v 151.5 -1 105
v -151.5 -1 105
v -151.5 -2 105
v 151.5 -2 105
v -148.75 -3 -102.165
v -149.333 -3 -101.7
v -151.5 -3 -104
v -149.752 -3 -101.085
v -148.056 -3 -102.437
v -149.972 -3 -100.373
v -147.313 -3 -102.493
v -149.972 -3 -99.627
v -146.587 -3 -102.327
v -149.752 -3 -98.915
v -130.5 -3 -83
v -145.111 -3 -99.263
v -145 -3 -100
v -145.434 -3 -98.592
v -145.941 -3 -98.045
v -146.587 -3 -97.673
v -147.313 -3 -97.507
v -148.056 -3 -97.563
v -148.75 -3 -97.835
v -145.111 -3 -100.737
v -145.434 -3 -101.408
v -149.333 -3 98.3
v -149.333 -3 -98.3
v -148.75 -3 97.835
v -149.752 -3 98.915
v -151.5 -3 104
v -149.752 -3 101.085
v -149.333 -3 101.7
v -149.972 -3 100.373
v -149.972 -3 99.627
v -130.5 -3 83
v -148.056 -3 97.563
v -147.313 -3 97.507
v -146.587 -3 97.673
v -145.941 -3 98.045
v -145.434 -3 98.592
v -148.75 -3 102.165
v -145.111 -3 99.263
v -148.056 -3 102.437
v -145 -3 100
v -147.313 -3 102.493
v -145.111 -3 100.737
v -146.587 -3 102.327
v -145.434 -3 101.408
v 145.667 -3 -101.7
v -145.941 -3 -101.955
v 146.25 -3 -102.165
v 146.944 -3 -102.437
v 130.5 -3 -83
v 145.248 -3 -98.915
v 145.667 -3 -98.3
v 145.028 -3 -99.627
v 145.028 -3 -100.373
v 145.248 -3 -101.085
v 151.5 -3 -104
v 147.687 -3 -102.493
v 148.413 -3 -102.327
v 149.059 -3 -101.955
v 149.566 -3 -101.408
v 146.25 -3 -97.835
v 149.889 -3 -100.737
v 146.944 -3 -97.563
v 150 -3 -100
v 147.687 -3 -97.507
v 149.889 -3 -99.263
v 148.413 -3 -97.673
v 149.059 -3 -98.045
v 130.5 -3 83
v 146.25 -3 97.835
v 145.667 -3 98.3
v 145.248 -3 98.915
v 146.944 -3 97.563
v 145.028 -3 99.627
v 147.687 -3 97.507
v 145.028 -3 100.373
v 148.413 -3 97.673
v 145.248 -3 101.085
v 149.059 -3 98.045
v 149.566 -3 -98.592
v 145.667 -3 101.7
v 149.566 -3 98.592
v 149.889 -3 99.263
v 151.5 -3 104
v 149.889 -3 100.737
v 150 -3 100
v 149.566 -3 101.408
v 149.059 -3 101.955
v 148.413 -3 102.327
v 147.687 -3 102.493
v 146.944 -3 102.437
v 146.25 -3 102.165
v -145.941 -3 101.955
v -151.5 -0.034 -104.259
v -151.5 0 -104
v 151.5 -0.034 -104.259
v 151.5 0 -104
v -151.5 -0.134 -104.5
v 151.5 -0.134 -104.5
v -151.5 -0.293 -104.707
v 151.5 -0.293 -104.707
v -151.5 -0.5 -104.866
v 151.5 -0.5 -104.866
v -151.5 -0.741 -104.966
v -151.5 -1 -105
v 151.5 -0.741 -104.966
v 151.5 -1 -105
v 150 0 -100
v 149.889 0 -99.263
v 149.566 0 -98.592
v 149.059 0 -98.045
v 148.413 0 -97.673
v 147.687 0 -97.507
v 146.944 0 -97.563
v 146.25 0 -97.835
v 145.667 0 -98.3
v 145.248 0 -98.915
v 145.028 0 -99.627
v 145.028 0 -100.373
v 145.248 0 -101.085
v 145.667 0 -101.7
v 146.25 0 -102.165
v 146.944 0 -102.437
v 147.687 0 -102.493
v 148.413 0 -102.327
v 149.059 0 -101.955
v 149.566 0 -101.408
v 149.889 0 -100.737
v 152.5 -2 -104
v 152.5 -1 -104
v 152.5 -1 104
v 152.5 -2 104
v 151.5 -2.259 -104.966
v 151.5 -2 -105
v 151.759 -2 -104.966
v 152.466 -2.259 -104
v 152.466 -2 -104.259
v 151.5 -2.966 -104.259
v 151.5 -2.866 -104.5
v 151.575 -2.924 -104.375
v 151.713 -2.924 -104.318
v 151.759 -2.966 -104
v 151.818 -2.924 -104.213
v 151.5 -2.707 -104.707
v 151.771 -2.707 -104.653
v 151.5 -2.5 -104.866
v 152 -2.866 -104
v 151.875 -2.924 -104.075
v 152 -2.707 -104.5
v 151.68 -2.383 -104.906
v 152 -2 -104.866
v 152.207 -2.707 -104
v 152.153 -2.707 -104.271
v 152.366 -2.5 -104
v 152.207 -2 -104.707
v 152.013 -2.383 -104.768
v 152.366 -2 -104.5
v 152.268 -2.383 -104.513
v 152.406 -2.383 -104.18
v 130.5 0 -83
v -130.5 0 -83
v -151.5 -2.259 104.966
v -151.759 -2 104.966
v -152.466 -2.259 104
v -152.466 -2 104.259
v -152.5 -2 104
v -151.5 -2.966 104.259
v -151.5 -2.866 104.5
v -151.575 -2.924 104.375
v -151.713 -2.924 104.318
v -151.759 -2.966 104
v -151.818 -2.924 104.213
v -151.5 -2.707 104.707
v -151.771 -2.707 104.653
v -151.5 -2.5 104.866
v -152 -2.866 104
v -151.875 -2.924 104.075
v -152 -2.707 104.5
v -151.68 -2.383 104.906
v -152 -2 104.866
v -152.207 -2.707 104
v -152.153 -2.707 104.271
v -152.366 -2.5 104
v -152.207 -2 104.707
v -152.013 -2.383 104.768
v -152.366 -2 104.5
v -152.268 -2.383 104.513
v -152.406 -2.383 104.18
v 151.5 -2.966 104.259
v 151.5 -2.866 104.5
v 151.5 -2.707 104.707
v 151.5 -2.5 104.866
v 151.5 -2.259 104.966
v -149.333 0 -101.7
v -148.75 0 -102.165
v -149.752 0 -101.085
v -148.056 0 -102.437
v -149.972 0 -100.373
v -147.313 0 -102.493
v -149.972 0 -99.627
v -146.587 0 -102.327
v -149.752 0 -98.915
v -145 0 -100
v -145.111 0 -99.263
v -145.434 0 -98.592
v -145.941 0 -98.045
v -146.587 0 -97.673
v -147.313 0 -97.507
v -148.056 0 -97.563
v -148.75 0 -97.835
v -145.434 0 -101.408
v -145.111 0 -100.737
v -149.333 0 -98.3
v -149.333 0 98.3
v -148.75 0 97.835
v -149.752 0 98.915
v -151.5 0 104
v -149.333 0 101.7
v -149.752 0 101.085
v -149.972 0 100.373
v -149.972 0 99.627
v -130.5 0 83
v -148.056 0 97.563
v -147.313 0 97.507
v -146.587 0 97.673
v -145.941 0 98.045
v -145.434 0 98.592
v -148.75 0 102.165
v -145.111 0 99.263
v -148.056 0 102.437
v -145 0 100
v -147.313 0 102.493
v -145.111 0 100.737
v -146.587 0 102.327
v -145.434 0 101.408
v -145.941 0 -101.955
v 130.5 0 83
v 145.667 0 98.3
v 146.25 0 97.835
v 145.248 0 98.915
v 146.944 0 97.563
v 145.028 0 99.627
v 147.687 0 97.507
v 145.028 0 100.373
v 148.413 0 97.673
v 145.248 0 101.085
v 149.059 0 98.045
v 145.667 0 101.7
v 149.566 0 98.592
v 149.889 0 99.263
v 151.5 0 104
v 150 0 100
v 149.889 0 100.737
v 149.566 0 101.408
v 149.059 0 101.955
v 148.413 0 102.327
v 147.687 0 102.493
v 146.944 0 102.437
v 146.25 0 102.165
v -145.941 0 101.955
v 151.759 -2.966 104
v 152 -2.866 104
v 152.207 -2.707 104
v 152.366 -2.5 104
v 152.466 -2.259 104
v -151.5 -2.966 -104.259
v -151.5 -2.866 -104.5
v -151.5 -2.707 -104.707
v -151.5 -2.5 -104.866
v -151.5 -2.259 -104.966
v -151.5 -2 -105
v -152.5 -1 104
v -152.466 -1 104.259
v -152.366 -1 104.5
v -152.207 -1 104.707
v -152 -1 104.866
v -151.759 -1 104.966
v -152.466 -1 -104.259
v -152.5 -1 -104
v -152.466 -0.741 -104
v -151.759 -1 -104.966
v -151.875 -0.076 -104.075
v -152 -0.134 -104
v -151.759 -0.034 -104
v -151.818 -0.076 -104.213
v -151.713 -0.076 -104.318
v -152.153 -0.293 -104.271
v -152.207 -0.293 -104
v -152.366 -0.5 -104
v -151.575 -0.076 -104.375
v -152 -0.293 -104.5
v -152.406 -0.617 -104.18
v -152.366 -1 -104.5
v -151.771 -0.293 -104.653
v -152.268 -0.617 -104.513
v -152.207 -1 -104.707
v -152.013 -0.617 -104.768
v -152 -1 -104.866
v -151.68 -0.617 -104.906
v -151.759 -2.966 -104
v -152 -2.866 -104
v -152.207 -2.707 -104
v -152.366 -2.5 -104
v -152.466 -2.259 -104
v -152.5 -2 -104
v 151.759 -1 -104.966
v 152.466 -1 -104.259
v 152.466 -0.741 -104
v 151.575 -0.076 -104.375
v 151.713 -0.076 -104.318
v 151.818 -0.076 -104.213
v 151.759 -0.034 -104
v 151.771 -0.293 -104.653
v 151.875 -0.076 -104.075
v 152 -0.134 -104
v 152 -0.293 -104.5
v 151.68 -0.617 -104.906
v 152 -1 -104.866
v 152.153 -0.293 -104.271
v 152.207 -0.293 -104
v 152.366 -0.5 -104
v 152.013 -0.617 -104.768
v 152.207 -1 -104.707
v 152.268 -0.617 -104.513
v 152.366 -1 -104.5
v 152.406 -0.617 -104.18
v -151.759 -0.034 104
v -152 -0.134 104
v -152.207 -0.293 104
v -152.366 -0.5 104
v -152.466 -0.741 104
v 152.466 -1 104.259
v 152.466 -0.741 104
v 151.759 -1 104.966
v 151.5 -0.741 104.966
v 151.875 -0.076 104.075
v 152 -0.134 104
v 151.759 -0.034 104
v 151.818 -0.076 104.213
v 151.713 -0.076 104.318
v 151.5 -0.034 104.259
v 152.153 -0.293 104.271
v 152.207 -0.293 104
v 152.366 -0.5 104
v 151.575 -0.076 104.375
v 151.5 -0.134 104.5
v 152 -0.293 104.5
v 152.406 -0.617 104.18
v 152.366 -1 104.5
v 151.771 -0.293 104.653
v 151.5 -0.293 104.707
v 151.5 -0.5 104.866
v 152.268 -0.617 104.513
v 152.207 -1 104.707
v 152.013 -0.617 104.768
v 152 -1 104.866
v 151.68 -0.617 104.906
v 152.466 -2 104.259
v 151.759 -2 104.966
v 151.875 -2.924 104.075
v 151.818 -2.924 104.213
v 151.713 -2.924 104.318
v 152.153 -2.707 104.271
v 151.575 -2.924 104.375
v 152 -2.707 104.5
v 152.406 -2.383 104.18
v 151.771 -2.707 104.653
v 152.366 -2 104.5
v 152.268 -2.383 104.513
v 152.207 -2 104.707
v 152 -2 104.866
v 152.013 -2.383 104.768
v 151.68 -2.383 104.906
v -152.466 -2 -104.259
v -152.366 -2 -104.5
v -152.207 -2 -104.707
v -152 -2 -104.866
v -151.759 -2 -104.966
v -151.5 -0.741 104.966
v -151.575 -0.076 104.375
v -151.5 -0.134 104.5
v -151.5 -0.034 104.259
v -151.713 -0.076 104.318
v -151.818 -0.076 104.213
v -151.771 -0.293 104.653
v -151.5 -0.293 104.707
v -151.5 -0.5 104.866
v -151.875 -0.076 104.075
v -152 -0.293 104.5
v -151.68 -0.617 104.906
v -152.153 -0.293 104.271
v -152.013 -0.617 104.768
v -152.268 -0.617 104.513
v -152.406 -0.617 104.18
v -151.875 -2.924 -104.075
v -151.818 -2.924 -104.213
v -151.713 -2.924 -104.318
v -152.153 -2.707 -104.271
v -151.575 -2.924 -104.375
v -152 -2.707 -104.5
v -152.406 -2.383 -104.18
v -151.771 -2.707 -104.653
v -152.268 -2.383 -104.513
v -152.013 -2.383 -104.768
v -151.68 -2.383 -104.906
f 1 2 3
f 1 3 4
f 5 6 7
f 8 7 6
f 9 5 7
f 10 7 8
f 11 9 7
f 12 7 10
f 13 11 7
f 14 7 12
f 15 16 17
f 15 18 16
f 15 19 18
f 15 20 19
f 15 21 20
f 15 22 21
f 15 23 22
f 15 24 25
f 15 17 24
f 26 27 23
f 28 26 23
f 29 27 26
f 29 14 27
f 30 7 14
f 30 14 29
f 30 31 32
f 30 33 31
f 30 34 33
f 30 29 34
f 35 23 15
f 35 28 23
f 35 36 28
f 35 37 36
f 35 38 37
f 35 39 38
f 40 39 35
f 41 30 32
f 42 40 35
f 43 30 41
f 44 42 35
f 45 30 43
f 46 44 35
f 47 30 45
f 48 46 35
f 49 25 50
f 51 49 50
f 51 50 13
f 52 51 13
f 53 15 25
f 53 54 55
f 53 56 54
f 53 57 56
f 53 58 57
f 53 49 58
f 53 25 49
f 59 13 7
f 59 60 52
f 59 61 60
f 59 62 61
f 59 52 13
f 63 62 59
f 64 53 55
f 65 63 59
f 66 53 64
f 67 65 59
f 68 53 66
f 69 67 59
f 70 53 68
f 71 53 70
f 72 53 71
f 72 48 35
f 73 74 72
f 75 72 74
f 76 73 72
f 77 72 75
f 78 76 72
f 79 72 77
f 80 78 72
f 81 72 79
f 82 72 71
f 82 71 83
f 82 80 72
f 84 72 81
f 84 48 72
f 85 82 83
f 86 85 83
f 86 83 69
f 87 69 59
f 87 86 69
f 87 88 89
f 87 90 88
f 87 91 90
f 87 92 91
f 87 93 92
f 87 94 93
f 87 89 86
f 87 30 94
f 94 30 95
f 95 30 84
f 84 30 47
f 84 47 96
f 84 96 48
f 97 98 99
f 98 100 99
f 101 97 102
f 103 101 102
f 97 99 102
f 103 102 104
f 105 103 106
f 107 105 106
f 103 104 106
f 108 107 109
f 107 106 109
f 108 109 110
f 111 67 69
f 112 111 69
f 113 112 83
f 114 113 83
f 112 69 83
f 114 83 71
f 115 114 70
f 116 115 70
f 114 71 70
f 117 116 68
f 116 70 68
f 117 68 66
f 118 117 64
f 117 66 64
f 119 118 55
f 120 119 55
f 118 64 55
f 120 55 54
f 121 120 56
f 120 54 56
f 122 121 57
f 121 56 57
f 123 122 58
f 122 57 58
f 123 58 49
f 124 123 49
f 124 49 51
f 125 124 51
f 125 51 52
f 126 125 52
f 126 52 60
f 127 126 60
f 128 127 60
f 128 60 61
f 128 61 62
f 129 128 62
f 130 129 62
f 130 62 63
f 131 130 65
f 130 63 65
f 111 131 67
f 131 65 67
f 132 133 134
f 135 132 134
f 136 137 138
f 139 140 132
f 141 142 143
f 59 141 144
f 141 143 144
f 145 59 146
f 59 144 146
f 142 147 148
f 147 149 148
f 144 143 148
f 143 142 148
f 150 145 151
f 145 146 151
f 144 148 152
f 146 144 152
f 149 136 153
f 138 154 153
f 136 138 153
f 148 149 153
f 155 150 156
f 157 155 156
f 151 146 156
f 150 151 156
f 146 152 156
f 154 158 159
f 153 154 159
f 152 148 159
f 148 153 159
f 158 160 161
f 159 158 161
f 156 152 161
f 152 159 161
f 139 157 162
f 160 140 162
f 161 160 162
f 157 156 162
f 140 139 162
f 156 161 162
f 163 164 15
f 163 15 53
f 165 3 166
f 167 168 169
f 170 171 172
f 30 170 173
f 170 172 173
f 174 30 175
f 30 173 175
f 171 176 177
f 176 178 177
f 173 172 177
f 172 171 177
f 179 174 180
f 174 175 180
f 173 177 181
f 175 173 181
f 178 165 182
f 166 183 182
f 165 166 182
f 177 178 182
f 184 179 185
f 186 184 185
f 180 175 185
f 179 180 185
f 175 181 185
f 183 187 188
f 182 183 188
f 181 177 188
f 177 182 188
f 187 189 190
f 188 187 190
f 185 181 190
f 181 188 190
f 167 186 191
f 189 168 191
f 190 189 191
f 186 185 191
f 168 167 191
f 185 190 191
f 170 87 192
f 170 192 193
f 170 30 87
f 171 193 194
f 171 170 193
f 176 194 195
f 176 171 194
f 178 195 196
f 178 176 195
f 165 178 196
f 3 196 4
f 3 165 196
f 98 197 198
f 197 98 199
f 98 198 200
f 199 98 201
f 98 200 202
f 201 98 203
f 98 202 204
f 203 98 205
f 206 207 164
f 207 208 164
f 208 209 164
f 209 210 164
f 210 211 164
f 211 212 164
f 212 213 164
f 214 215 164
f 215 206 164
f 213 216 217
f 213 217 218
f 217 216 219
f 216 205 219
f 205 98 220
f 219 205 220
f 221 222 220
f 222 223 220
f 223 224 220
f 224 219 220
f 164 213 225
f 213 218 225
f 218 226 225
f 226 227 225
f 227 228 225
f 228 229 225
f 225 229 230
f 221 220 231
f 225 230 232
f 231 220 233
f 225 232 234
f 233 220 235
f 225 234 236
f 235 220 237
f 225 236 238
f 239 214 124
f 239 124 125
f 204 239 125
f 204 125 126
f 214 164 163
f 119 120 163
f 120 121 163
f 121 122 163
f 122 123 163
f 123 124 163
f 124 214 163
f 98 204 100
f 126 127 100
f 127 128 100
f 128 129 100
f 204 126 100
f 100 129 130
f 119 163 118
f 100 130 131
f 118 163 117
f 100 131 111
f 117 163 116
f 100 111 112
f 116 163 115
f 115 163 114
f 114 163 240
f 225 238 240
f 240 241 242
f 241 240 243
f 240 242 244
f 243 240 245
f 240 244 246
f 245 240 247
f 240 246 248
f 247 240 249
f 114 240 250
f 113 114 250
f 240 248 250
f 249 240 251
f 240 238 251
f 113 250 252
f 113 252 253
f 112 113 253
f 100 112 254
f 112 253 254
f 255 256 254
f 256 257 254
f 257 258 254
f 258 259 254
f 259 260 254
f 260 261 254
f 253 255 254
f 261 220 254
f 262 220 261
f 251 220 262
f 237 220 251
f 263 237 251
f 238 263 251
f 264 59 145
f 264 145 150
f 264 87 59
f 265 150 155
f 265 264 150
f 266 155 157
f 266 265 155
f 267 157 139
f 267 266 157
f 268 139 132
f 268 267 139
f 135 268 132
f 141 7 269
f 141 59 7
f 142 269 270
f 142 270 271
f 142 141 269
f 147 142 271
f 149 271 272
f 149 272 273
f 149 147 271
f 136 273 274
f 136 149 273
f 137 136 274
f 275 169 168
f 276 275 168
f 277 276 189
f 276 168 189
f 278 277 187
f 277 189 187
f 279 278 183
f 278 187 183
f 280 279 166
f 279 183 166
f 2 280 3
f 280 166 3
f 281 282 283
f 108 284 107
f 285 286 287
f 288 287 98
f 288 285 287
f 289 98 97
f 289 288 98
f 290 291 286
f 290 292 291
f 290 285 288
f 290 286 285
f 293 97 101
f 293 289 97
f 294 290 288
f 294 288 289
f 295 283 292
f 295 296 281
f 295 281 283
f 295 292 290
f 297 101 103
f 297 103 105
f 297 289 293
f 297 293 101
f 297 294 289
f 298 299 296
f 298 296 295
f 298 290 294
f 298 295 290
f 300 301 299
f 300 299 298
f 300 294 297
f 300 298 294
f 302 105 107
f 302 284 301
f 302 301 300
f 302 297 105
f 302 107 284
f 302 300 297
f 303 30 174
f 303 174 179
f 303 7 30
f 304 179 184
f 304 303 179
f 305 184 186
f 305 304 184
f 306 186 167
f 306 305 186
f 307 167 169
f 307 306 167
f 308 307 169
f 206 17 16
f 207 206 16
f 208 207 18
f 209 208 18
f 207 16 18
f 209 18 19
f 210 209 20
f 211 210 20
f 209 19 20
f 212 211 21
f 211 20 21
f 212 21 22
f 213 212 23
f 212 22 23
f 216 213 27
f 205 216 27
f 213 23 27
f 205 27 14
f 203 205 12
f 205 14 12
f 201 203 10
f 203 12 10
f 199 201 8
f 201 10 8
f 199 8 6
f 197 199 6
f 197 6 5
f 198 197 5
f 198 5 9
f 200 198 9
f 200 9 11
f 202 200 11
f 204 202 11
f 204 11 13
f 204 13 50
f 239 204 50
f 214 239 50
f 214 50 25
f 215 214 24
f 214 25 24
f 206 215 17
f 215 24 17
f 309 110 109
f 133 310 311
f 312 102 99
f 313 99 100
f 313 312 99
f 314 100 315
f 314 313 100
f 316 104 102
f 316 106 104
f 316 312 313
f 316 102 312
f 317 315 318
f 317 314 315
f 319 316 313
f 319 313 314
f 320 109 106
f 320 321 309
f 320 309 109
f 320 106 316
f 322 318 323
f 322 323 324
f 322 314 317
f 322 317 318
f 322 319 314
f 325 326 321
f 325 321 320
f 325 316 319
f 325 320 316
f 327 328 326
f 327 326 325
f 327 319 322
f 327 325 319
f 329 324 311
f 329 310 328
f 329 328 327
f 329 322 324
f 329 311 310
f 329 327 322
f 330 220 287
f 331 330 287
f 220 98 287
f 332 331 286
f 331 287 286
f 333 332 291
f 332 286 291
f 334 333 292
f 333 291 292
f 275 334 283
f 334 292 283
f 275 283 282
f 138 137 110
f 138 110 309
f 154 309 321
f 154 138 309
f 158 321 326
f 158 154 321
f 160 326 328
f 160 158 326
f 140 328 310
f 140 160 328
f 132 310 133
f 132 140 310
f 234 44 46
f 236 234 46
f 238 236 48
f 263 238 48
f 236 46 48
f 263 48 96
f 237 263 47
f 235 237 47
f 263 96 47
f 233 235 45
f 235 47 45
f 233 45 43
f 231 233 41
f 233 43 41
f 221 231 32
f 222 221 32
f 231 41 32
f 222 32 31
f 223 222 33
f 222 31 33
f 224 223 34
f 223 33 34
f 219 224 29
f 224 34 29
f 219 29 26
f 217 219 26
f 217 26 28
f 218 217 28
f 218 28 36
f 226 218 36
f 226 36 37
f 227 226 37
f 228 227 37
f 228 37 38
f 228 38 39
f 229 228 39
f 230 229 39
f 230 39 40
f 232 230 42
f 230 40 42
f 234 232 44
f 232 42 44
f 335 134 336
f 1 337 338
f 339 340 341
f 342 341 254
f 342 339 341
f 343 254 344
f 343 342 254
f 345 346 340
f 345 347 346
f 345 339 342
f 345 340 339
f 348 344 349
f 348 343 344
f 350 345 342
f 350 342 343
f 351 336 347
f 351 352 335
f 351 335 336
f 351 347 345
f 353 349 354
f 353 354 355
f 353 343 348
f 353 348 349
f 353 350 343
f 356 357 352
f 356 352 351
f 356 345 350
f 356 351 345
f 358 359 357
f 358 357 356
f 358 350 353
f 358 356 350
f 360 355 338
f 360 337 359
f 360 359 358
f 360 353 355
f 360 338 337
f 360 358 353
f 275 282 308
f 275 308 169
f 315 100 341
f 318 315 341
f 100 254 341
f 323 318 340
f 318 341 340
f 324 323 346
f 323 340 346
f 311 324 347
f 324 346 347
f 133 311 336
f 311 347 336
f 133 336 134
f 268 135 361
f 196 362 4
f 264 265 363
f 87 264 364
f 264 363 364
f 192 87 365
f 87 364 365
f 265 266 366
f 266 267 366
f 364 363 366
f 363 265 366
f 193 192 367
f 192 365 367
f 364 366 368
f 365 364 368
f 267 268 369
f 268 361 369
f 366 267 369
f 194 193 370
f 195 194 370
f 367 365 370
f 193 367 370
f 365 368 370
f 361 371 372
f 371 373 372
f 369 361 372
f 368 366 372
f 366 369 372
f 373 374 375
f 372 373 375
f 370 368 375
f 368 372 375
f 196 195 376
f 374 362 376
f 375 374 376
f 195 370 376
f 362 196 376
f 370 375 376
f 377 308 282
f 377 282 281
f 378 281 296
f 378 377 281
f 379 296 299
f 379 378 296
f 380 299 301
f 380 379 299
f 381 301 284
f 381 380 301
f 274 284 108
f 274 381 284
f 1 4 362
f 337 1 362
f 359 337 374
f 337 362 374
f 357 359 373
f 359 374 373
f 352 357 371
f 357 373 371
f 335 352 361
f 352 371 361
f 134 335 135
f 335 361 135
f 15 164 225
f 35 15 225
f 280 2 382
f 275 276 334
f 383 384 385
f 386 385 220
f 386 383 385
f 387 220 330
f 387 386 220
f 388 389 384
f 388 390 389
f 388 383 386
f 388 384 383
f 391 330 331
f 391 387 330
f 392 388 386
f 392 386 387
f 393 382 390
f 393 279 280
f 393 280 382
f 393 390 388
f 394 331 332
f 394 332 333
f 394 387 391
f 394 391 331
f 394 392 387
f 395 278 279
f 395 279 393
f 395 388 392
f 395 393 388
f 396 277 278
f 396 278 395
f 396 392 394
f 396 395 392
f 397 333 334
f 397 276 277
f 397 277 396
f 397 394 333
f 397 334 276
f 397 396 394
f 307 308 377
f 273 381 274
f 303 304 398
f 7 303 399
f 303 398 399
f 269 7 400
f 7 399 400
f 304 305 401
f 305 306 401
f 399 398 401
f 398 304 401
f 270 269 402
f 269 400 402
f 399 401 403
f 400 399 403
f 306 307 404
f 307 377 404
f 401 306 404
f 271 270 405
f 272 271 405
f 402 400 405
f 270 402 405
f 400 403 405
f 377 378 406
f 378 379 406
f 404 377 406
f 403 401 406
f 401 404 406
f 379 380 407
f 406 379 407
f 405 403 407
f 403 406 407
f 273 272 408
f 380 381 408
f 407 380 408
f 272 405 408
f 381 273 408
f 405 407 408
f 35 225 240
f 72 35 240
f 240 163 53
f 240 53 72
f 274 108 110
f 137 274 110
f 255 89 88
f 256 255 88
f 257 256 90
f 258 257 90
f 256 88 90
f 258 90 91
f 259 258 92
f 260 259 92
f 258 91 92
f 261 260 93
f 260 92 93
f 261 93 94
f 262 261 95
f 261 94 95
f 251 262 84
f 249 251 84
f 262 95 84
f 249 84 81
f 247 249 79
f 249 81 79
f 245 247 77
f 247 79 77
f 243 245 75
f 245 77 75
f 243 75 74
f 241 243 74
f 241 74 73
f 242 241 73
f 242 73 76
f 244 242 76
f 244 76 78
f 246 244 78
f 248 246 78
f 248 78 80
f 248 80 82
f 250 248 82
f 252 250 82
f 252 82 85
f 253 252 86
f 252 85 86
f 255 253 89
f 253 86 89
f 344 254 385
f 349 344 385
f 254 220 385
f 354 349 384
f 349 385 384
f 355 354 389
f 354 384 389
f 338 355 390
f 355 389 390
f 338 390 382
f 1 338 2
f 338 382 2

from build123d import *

# Parameters (mm, degrees)
F0_W     = 305
F0_H     = 210
F0_W_2   = 261
F0_H_2   = 166
F1_DEPTH = 3
F2_R     = 1
F3_R     = 1
F4_R     = 2.5
F5_DEPTH = 3


with BuildPart() as f1:
    # F0 (on Front) → F1 (new body)
    with BuildSketch(Plane.XZ):
        Rectangle(F0_W, F0_H)
        Rectangle(F0_W_2, F0_H_2, mode=Mode.SUBTRACT)
    extrude(amount=F1_DEPTH)

    # F2
    f2_edges = [f1.edges().sort_by_distance(p)[0] for p in [
        (-152.5, -1.5, 105),
        (-152.5, -1.5, -105),
        (152.5, -1.5, -105),
        (152.5, -1.5, 105),
    ]]
    fillet(f2_edges, radius=F2_R)

    # F3
    f3_edges = [f1.edges().sort_by_distance(p)[0] for p in [
        (0, -3, -105),
        (0, 0, -105),
    ]]
    fillet(f3_edges, radius=F3_R)

    # F4 (on face) → F5 (cut, through all)
    with BuildSketch(Plane.XZ.offset(3)):
        with Locations((-147.5, 100)):
            Circle(F4_R)
        with Locations((147.5, 100)):
            Circle(F4_R)
        with Locations((147.5, -100)):
            Circle(F4_R)
        with Locations((-147.5, -100)):
            Circle(F4_R)
    extrude(amount=-F5_DEPTH, mode=Mode.SUBTRACT)


solid = f1.part
